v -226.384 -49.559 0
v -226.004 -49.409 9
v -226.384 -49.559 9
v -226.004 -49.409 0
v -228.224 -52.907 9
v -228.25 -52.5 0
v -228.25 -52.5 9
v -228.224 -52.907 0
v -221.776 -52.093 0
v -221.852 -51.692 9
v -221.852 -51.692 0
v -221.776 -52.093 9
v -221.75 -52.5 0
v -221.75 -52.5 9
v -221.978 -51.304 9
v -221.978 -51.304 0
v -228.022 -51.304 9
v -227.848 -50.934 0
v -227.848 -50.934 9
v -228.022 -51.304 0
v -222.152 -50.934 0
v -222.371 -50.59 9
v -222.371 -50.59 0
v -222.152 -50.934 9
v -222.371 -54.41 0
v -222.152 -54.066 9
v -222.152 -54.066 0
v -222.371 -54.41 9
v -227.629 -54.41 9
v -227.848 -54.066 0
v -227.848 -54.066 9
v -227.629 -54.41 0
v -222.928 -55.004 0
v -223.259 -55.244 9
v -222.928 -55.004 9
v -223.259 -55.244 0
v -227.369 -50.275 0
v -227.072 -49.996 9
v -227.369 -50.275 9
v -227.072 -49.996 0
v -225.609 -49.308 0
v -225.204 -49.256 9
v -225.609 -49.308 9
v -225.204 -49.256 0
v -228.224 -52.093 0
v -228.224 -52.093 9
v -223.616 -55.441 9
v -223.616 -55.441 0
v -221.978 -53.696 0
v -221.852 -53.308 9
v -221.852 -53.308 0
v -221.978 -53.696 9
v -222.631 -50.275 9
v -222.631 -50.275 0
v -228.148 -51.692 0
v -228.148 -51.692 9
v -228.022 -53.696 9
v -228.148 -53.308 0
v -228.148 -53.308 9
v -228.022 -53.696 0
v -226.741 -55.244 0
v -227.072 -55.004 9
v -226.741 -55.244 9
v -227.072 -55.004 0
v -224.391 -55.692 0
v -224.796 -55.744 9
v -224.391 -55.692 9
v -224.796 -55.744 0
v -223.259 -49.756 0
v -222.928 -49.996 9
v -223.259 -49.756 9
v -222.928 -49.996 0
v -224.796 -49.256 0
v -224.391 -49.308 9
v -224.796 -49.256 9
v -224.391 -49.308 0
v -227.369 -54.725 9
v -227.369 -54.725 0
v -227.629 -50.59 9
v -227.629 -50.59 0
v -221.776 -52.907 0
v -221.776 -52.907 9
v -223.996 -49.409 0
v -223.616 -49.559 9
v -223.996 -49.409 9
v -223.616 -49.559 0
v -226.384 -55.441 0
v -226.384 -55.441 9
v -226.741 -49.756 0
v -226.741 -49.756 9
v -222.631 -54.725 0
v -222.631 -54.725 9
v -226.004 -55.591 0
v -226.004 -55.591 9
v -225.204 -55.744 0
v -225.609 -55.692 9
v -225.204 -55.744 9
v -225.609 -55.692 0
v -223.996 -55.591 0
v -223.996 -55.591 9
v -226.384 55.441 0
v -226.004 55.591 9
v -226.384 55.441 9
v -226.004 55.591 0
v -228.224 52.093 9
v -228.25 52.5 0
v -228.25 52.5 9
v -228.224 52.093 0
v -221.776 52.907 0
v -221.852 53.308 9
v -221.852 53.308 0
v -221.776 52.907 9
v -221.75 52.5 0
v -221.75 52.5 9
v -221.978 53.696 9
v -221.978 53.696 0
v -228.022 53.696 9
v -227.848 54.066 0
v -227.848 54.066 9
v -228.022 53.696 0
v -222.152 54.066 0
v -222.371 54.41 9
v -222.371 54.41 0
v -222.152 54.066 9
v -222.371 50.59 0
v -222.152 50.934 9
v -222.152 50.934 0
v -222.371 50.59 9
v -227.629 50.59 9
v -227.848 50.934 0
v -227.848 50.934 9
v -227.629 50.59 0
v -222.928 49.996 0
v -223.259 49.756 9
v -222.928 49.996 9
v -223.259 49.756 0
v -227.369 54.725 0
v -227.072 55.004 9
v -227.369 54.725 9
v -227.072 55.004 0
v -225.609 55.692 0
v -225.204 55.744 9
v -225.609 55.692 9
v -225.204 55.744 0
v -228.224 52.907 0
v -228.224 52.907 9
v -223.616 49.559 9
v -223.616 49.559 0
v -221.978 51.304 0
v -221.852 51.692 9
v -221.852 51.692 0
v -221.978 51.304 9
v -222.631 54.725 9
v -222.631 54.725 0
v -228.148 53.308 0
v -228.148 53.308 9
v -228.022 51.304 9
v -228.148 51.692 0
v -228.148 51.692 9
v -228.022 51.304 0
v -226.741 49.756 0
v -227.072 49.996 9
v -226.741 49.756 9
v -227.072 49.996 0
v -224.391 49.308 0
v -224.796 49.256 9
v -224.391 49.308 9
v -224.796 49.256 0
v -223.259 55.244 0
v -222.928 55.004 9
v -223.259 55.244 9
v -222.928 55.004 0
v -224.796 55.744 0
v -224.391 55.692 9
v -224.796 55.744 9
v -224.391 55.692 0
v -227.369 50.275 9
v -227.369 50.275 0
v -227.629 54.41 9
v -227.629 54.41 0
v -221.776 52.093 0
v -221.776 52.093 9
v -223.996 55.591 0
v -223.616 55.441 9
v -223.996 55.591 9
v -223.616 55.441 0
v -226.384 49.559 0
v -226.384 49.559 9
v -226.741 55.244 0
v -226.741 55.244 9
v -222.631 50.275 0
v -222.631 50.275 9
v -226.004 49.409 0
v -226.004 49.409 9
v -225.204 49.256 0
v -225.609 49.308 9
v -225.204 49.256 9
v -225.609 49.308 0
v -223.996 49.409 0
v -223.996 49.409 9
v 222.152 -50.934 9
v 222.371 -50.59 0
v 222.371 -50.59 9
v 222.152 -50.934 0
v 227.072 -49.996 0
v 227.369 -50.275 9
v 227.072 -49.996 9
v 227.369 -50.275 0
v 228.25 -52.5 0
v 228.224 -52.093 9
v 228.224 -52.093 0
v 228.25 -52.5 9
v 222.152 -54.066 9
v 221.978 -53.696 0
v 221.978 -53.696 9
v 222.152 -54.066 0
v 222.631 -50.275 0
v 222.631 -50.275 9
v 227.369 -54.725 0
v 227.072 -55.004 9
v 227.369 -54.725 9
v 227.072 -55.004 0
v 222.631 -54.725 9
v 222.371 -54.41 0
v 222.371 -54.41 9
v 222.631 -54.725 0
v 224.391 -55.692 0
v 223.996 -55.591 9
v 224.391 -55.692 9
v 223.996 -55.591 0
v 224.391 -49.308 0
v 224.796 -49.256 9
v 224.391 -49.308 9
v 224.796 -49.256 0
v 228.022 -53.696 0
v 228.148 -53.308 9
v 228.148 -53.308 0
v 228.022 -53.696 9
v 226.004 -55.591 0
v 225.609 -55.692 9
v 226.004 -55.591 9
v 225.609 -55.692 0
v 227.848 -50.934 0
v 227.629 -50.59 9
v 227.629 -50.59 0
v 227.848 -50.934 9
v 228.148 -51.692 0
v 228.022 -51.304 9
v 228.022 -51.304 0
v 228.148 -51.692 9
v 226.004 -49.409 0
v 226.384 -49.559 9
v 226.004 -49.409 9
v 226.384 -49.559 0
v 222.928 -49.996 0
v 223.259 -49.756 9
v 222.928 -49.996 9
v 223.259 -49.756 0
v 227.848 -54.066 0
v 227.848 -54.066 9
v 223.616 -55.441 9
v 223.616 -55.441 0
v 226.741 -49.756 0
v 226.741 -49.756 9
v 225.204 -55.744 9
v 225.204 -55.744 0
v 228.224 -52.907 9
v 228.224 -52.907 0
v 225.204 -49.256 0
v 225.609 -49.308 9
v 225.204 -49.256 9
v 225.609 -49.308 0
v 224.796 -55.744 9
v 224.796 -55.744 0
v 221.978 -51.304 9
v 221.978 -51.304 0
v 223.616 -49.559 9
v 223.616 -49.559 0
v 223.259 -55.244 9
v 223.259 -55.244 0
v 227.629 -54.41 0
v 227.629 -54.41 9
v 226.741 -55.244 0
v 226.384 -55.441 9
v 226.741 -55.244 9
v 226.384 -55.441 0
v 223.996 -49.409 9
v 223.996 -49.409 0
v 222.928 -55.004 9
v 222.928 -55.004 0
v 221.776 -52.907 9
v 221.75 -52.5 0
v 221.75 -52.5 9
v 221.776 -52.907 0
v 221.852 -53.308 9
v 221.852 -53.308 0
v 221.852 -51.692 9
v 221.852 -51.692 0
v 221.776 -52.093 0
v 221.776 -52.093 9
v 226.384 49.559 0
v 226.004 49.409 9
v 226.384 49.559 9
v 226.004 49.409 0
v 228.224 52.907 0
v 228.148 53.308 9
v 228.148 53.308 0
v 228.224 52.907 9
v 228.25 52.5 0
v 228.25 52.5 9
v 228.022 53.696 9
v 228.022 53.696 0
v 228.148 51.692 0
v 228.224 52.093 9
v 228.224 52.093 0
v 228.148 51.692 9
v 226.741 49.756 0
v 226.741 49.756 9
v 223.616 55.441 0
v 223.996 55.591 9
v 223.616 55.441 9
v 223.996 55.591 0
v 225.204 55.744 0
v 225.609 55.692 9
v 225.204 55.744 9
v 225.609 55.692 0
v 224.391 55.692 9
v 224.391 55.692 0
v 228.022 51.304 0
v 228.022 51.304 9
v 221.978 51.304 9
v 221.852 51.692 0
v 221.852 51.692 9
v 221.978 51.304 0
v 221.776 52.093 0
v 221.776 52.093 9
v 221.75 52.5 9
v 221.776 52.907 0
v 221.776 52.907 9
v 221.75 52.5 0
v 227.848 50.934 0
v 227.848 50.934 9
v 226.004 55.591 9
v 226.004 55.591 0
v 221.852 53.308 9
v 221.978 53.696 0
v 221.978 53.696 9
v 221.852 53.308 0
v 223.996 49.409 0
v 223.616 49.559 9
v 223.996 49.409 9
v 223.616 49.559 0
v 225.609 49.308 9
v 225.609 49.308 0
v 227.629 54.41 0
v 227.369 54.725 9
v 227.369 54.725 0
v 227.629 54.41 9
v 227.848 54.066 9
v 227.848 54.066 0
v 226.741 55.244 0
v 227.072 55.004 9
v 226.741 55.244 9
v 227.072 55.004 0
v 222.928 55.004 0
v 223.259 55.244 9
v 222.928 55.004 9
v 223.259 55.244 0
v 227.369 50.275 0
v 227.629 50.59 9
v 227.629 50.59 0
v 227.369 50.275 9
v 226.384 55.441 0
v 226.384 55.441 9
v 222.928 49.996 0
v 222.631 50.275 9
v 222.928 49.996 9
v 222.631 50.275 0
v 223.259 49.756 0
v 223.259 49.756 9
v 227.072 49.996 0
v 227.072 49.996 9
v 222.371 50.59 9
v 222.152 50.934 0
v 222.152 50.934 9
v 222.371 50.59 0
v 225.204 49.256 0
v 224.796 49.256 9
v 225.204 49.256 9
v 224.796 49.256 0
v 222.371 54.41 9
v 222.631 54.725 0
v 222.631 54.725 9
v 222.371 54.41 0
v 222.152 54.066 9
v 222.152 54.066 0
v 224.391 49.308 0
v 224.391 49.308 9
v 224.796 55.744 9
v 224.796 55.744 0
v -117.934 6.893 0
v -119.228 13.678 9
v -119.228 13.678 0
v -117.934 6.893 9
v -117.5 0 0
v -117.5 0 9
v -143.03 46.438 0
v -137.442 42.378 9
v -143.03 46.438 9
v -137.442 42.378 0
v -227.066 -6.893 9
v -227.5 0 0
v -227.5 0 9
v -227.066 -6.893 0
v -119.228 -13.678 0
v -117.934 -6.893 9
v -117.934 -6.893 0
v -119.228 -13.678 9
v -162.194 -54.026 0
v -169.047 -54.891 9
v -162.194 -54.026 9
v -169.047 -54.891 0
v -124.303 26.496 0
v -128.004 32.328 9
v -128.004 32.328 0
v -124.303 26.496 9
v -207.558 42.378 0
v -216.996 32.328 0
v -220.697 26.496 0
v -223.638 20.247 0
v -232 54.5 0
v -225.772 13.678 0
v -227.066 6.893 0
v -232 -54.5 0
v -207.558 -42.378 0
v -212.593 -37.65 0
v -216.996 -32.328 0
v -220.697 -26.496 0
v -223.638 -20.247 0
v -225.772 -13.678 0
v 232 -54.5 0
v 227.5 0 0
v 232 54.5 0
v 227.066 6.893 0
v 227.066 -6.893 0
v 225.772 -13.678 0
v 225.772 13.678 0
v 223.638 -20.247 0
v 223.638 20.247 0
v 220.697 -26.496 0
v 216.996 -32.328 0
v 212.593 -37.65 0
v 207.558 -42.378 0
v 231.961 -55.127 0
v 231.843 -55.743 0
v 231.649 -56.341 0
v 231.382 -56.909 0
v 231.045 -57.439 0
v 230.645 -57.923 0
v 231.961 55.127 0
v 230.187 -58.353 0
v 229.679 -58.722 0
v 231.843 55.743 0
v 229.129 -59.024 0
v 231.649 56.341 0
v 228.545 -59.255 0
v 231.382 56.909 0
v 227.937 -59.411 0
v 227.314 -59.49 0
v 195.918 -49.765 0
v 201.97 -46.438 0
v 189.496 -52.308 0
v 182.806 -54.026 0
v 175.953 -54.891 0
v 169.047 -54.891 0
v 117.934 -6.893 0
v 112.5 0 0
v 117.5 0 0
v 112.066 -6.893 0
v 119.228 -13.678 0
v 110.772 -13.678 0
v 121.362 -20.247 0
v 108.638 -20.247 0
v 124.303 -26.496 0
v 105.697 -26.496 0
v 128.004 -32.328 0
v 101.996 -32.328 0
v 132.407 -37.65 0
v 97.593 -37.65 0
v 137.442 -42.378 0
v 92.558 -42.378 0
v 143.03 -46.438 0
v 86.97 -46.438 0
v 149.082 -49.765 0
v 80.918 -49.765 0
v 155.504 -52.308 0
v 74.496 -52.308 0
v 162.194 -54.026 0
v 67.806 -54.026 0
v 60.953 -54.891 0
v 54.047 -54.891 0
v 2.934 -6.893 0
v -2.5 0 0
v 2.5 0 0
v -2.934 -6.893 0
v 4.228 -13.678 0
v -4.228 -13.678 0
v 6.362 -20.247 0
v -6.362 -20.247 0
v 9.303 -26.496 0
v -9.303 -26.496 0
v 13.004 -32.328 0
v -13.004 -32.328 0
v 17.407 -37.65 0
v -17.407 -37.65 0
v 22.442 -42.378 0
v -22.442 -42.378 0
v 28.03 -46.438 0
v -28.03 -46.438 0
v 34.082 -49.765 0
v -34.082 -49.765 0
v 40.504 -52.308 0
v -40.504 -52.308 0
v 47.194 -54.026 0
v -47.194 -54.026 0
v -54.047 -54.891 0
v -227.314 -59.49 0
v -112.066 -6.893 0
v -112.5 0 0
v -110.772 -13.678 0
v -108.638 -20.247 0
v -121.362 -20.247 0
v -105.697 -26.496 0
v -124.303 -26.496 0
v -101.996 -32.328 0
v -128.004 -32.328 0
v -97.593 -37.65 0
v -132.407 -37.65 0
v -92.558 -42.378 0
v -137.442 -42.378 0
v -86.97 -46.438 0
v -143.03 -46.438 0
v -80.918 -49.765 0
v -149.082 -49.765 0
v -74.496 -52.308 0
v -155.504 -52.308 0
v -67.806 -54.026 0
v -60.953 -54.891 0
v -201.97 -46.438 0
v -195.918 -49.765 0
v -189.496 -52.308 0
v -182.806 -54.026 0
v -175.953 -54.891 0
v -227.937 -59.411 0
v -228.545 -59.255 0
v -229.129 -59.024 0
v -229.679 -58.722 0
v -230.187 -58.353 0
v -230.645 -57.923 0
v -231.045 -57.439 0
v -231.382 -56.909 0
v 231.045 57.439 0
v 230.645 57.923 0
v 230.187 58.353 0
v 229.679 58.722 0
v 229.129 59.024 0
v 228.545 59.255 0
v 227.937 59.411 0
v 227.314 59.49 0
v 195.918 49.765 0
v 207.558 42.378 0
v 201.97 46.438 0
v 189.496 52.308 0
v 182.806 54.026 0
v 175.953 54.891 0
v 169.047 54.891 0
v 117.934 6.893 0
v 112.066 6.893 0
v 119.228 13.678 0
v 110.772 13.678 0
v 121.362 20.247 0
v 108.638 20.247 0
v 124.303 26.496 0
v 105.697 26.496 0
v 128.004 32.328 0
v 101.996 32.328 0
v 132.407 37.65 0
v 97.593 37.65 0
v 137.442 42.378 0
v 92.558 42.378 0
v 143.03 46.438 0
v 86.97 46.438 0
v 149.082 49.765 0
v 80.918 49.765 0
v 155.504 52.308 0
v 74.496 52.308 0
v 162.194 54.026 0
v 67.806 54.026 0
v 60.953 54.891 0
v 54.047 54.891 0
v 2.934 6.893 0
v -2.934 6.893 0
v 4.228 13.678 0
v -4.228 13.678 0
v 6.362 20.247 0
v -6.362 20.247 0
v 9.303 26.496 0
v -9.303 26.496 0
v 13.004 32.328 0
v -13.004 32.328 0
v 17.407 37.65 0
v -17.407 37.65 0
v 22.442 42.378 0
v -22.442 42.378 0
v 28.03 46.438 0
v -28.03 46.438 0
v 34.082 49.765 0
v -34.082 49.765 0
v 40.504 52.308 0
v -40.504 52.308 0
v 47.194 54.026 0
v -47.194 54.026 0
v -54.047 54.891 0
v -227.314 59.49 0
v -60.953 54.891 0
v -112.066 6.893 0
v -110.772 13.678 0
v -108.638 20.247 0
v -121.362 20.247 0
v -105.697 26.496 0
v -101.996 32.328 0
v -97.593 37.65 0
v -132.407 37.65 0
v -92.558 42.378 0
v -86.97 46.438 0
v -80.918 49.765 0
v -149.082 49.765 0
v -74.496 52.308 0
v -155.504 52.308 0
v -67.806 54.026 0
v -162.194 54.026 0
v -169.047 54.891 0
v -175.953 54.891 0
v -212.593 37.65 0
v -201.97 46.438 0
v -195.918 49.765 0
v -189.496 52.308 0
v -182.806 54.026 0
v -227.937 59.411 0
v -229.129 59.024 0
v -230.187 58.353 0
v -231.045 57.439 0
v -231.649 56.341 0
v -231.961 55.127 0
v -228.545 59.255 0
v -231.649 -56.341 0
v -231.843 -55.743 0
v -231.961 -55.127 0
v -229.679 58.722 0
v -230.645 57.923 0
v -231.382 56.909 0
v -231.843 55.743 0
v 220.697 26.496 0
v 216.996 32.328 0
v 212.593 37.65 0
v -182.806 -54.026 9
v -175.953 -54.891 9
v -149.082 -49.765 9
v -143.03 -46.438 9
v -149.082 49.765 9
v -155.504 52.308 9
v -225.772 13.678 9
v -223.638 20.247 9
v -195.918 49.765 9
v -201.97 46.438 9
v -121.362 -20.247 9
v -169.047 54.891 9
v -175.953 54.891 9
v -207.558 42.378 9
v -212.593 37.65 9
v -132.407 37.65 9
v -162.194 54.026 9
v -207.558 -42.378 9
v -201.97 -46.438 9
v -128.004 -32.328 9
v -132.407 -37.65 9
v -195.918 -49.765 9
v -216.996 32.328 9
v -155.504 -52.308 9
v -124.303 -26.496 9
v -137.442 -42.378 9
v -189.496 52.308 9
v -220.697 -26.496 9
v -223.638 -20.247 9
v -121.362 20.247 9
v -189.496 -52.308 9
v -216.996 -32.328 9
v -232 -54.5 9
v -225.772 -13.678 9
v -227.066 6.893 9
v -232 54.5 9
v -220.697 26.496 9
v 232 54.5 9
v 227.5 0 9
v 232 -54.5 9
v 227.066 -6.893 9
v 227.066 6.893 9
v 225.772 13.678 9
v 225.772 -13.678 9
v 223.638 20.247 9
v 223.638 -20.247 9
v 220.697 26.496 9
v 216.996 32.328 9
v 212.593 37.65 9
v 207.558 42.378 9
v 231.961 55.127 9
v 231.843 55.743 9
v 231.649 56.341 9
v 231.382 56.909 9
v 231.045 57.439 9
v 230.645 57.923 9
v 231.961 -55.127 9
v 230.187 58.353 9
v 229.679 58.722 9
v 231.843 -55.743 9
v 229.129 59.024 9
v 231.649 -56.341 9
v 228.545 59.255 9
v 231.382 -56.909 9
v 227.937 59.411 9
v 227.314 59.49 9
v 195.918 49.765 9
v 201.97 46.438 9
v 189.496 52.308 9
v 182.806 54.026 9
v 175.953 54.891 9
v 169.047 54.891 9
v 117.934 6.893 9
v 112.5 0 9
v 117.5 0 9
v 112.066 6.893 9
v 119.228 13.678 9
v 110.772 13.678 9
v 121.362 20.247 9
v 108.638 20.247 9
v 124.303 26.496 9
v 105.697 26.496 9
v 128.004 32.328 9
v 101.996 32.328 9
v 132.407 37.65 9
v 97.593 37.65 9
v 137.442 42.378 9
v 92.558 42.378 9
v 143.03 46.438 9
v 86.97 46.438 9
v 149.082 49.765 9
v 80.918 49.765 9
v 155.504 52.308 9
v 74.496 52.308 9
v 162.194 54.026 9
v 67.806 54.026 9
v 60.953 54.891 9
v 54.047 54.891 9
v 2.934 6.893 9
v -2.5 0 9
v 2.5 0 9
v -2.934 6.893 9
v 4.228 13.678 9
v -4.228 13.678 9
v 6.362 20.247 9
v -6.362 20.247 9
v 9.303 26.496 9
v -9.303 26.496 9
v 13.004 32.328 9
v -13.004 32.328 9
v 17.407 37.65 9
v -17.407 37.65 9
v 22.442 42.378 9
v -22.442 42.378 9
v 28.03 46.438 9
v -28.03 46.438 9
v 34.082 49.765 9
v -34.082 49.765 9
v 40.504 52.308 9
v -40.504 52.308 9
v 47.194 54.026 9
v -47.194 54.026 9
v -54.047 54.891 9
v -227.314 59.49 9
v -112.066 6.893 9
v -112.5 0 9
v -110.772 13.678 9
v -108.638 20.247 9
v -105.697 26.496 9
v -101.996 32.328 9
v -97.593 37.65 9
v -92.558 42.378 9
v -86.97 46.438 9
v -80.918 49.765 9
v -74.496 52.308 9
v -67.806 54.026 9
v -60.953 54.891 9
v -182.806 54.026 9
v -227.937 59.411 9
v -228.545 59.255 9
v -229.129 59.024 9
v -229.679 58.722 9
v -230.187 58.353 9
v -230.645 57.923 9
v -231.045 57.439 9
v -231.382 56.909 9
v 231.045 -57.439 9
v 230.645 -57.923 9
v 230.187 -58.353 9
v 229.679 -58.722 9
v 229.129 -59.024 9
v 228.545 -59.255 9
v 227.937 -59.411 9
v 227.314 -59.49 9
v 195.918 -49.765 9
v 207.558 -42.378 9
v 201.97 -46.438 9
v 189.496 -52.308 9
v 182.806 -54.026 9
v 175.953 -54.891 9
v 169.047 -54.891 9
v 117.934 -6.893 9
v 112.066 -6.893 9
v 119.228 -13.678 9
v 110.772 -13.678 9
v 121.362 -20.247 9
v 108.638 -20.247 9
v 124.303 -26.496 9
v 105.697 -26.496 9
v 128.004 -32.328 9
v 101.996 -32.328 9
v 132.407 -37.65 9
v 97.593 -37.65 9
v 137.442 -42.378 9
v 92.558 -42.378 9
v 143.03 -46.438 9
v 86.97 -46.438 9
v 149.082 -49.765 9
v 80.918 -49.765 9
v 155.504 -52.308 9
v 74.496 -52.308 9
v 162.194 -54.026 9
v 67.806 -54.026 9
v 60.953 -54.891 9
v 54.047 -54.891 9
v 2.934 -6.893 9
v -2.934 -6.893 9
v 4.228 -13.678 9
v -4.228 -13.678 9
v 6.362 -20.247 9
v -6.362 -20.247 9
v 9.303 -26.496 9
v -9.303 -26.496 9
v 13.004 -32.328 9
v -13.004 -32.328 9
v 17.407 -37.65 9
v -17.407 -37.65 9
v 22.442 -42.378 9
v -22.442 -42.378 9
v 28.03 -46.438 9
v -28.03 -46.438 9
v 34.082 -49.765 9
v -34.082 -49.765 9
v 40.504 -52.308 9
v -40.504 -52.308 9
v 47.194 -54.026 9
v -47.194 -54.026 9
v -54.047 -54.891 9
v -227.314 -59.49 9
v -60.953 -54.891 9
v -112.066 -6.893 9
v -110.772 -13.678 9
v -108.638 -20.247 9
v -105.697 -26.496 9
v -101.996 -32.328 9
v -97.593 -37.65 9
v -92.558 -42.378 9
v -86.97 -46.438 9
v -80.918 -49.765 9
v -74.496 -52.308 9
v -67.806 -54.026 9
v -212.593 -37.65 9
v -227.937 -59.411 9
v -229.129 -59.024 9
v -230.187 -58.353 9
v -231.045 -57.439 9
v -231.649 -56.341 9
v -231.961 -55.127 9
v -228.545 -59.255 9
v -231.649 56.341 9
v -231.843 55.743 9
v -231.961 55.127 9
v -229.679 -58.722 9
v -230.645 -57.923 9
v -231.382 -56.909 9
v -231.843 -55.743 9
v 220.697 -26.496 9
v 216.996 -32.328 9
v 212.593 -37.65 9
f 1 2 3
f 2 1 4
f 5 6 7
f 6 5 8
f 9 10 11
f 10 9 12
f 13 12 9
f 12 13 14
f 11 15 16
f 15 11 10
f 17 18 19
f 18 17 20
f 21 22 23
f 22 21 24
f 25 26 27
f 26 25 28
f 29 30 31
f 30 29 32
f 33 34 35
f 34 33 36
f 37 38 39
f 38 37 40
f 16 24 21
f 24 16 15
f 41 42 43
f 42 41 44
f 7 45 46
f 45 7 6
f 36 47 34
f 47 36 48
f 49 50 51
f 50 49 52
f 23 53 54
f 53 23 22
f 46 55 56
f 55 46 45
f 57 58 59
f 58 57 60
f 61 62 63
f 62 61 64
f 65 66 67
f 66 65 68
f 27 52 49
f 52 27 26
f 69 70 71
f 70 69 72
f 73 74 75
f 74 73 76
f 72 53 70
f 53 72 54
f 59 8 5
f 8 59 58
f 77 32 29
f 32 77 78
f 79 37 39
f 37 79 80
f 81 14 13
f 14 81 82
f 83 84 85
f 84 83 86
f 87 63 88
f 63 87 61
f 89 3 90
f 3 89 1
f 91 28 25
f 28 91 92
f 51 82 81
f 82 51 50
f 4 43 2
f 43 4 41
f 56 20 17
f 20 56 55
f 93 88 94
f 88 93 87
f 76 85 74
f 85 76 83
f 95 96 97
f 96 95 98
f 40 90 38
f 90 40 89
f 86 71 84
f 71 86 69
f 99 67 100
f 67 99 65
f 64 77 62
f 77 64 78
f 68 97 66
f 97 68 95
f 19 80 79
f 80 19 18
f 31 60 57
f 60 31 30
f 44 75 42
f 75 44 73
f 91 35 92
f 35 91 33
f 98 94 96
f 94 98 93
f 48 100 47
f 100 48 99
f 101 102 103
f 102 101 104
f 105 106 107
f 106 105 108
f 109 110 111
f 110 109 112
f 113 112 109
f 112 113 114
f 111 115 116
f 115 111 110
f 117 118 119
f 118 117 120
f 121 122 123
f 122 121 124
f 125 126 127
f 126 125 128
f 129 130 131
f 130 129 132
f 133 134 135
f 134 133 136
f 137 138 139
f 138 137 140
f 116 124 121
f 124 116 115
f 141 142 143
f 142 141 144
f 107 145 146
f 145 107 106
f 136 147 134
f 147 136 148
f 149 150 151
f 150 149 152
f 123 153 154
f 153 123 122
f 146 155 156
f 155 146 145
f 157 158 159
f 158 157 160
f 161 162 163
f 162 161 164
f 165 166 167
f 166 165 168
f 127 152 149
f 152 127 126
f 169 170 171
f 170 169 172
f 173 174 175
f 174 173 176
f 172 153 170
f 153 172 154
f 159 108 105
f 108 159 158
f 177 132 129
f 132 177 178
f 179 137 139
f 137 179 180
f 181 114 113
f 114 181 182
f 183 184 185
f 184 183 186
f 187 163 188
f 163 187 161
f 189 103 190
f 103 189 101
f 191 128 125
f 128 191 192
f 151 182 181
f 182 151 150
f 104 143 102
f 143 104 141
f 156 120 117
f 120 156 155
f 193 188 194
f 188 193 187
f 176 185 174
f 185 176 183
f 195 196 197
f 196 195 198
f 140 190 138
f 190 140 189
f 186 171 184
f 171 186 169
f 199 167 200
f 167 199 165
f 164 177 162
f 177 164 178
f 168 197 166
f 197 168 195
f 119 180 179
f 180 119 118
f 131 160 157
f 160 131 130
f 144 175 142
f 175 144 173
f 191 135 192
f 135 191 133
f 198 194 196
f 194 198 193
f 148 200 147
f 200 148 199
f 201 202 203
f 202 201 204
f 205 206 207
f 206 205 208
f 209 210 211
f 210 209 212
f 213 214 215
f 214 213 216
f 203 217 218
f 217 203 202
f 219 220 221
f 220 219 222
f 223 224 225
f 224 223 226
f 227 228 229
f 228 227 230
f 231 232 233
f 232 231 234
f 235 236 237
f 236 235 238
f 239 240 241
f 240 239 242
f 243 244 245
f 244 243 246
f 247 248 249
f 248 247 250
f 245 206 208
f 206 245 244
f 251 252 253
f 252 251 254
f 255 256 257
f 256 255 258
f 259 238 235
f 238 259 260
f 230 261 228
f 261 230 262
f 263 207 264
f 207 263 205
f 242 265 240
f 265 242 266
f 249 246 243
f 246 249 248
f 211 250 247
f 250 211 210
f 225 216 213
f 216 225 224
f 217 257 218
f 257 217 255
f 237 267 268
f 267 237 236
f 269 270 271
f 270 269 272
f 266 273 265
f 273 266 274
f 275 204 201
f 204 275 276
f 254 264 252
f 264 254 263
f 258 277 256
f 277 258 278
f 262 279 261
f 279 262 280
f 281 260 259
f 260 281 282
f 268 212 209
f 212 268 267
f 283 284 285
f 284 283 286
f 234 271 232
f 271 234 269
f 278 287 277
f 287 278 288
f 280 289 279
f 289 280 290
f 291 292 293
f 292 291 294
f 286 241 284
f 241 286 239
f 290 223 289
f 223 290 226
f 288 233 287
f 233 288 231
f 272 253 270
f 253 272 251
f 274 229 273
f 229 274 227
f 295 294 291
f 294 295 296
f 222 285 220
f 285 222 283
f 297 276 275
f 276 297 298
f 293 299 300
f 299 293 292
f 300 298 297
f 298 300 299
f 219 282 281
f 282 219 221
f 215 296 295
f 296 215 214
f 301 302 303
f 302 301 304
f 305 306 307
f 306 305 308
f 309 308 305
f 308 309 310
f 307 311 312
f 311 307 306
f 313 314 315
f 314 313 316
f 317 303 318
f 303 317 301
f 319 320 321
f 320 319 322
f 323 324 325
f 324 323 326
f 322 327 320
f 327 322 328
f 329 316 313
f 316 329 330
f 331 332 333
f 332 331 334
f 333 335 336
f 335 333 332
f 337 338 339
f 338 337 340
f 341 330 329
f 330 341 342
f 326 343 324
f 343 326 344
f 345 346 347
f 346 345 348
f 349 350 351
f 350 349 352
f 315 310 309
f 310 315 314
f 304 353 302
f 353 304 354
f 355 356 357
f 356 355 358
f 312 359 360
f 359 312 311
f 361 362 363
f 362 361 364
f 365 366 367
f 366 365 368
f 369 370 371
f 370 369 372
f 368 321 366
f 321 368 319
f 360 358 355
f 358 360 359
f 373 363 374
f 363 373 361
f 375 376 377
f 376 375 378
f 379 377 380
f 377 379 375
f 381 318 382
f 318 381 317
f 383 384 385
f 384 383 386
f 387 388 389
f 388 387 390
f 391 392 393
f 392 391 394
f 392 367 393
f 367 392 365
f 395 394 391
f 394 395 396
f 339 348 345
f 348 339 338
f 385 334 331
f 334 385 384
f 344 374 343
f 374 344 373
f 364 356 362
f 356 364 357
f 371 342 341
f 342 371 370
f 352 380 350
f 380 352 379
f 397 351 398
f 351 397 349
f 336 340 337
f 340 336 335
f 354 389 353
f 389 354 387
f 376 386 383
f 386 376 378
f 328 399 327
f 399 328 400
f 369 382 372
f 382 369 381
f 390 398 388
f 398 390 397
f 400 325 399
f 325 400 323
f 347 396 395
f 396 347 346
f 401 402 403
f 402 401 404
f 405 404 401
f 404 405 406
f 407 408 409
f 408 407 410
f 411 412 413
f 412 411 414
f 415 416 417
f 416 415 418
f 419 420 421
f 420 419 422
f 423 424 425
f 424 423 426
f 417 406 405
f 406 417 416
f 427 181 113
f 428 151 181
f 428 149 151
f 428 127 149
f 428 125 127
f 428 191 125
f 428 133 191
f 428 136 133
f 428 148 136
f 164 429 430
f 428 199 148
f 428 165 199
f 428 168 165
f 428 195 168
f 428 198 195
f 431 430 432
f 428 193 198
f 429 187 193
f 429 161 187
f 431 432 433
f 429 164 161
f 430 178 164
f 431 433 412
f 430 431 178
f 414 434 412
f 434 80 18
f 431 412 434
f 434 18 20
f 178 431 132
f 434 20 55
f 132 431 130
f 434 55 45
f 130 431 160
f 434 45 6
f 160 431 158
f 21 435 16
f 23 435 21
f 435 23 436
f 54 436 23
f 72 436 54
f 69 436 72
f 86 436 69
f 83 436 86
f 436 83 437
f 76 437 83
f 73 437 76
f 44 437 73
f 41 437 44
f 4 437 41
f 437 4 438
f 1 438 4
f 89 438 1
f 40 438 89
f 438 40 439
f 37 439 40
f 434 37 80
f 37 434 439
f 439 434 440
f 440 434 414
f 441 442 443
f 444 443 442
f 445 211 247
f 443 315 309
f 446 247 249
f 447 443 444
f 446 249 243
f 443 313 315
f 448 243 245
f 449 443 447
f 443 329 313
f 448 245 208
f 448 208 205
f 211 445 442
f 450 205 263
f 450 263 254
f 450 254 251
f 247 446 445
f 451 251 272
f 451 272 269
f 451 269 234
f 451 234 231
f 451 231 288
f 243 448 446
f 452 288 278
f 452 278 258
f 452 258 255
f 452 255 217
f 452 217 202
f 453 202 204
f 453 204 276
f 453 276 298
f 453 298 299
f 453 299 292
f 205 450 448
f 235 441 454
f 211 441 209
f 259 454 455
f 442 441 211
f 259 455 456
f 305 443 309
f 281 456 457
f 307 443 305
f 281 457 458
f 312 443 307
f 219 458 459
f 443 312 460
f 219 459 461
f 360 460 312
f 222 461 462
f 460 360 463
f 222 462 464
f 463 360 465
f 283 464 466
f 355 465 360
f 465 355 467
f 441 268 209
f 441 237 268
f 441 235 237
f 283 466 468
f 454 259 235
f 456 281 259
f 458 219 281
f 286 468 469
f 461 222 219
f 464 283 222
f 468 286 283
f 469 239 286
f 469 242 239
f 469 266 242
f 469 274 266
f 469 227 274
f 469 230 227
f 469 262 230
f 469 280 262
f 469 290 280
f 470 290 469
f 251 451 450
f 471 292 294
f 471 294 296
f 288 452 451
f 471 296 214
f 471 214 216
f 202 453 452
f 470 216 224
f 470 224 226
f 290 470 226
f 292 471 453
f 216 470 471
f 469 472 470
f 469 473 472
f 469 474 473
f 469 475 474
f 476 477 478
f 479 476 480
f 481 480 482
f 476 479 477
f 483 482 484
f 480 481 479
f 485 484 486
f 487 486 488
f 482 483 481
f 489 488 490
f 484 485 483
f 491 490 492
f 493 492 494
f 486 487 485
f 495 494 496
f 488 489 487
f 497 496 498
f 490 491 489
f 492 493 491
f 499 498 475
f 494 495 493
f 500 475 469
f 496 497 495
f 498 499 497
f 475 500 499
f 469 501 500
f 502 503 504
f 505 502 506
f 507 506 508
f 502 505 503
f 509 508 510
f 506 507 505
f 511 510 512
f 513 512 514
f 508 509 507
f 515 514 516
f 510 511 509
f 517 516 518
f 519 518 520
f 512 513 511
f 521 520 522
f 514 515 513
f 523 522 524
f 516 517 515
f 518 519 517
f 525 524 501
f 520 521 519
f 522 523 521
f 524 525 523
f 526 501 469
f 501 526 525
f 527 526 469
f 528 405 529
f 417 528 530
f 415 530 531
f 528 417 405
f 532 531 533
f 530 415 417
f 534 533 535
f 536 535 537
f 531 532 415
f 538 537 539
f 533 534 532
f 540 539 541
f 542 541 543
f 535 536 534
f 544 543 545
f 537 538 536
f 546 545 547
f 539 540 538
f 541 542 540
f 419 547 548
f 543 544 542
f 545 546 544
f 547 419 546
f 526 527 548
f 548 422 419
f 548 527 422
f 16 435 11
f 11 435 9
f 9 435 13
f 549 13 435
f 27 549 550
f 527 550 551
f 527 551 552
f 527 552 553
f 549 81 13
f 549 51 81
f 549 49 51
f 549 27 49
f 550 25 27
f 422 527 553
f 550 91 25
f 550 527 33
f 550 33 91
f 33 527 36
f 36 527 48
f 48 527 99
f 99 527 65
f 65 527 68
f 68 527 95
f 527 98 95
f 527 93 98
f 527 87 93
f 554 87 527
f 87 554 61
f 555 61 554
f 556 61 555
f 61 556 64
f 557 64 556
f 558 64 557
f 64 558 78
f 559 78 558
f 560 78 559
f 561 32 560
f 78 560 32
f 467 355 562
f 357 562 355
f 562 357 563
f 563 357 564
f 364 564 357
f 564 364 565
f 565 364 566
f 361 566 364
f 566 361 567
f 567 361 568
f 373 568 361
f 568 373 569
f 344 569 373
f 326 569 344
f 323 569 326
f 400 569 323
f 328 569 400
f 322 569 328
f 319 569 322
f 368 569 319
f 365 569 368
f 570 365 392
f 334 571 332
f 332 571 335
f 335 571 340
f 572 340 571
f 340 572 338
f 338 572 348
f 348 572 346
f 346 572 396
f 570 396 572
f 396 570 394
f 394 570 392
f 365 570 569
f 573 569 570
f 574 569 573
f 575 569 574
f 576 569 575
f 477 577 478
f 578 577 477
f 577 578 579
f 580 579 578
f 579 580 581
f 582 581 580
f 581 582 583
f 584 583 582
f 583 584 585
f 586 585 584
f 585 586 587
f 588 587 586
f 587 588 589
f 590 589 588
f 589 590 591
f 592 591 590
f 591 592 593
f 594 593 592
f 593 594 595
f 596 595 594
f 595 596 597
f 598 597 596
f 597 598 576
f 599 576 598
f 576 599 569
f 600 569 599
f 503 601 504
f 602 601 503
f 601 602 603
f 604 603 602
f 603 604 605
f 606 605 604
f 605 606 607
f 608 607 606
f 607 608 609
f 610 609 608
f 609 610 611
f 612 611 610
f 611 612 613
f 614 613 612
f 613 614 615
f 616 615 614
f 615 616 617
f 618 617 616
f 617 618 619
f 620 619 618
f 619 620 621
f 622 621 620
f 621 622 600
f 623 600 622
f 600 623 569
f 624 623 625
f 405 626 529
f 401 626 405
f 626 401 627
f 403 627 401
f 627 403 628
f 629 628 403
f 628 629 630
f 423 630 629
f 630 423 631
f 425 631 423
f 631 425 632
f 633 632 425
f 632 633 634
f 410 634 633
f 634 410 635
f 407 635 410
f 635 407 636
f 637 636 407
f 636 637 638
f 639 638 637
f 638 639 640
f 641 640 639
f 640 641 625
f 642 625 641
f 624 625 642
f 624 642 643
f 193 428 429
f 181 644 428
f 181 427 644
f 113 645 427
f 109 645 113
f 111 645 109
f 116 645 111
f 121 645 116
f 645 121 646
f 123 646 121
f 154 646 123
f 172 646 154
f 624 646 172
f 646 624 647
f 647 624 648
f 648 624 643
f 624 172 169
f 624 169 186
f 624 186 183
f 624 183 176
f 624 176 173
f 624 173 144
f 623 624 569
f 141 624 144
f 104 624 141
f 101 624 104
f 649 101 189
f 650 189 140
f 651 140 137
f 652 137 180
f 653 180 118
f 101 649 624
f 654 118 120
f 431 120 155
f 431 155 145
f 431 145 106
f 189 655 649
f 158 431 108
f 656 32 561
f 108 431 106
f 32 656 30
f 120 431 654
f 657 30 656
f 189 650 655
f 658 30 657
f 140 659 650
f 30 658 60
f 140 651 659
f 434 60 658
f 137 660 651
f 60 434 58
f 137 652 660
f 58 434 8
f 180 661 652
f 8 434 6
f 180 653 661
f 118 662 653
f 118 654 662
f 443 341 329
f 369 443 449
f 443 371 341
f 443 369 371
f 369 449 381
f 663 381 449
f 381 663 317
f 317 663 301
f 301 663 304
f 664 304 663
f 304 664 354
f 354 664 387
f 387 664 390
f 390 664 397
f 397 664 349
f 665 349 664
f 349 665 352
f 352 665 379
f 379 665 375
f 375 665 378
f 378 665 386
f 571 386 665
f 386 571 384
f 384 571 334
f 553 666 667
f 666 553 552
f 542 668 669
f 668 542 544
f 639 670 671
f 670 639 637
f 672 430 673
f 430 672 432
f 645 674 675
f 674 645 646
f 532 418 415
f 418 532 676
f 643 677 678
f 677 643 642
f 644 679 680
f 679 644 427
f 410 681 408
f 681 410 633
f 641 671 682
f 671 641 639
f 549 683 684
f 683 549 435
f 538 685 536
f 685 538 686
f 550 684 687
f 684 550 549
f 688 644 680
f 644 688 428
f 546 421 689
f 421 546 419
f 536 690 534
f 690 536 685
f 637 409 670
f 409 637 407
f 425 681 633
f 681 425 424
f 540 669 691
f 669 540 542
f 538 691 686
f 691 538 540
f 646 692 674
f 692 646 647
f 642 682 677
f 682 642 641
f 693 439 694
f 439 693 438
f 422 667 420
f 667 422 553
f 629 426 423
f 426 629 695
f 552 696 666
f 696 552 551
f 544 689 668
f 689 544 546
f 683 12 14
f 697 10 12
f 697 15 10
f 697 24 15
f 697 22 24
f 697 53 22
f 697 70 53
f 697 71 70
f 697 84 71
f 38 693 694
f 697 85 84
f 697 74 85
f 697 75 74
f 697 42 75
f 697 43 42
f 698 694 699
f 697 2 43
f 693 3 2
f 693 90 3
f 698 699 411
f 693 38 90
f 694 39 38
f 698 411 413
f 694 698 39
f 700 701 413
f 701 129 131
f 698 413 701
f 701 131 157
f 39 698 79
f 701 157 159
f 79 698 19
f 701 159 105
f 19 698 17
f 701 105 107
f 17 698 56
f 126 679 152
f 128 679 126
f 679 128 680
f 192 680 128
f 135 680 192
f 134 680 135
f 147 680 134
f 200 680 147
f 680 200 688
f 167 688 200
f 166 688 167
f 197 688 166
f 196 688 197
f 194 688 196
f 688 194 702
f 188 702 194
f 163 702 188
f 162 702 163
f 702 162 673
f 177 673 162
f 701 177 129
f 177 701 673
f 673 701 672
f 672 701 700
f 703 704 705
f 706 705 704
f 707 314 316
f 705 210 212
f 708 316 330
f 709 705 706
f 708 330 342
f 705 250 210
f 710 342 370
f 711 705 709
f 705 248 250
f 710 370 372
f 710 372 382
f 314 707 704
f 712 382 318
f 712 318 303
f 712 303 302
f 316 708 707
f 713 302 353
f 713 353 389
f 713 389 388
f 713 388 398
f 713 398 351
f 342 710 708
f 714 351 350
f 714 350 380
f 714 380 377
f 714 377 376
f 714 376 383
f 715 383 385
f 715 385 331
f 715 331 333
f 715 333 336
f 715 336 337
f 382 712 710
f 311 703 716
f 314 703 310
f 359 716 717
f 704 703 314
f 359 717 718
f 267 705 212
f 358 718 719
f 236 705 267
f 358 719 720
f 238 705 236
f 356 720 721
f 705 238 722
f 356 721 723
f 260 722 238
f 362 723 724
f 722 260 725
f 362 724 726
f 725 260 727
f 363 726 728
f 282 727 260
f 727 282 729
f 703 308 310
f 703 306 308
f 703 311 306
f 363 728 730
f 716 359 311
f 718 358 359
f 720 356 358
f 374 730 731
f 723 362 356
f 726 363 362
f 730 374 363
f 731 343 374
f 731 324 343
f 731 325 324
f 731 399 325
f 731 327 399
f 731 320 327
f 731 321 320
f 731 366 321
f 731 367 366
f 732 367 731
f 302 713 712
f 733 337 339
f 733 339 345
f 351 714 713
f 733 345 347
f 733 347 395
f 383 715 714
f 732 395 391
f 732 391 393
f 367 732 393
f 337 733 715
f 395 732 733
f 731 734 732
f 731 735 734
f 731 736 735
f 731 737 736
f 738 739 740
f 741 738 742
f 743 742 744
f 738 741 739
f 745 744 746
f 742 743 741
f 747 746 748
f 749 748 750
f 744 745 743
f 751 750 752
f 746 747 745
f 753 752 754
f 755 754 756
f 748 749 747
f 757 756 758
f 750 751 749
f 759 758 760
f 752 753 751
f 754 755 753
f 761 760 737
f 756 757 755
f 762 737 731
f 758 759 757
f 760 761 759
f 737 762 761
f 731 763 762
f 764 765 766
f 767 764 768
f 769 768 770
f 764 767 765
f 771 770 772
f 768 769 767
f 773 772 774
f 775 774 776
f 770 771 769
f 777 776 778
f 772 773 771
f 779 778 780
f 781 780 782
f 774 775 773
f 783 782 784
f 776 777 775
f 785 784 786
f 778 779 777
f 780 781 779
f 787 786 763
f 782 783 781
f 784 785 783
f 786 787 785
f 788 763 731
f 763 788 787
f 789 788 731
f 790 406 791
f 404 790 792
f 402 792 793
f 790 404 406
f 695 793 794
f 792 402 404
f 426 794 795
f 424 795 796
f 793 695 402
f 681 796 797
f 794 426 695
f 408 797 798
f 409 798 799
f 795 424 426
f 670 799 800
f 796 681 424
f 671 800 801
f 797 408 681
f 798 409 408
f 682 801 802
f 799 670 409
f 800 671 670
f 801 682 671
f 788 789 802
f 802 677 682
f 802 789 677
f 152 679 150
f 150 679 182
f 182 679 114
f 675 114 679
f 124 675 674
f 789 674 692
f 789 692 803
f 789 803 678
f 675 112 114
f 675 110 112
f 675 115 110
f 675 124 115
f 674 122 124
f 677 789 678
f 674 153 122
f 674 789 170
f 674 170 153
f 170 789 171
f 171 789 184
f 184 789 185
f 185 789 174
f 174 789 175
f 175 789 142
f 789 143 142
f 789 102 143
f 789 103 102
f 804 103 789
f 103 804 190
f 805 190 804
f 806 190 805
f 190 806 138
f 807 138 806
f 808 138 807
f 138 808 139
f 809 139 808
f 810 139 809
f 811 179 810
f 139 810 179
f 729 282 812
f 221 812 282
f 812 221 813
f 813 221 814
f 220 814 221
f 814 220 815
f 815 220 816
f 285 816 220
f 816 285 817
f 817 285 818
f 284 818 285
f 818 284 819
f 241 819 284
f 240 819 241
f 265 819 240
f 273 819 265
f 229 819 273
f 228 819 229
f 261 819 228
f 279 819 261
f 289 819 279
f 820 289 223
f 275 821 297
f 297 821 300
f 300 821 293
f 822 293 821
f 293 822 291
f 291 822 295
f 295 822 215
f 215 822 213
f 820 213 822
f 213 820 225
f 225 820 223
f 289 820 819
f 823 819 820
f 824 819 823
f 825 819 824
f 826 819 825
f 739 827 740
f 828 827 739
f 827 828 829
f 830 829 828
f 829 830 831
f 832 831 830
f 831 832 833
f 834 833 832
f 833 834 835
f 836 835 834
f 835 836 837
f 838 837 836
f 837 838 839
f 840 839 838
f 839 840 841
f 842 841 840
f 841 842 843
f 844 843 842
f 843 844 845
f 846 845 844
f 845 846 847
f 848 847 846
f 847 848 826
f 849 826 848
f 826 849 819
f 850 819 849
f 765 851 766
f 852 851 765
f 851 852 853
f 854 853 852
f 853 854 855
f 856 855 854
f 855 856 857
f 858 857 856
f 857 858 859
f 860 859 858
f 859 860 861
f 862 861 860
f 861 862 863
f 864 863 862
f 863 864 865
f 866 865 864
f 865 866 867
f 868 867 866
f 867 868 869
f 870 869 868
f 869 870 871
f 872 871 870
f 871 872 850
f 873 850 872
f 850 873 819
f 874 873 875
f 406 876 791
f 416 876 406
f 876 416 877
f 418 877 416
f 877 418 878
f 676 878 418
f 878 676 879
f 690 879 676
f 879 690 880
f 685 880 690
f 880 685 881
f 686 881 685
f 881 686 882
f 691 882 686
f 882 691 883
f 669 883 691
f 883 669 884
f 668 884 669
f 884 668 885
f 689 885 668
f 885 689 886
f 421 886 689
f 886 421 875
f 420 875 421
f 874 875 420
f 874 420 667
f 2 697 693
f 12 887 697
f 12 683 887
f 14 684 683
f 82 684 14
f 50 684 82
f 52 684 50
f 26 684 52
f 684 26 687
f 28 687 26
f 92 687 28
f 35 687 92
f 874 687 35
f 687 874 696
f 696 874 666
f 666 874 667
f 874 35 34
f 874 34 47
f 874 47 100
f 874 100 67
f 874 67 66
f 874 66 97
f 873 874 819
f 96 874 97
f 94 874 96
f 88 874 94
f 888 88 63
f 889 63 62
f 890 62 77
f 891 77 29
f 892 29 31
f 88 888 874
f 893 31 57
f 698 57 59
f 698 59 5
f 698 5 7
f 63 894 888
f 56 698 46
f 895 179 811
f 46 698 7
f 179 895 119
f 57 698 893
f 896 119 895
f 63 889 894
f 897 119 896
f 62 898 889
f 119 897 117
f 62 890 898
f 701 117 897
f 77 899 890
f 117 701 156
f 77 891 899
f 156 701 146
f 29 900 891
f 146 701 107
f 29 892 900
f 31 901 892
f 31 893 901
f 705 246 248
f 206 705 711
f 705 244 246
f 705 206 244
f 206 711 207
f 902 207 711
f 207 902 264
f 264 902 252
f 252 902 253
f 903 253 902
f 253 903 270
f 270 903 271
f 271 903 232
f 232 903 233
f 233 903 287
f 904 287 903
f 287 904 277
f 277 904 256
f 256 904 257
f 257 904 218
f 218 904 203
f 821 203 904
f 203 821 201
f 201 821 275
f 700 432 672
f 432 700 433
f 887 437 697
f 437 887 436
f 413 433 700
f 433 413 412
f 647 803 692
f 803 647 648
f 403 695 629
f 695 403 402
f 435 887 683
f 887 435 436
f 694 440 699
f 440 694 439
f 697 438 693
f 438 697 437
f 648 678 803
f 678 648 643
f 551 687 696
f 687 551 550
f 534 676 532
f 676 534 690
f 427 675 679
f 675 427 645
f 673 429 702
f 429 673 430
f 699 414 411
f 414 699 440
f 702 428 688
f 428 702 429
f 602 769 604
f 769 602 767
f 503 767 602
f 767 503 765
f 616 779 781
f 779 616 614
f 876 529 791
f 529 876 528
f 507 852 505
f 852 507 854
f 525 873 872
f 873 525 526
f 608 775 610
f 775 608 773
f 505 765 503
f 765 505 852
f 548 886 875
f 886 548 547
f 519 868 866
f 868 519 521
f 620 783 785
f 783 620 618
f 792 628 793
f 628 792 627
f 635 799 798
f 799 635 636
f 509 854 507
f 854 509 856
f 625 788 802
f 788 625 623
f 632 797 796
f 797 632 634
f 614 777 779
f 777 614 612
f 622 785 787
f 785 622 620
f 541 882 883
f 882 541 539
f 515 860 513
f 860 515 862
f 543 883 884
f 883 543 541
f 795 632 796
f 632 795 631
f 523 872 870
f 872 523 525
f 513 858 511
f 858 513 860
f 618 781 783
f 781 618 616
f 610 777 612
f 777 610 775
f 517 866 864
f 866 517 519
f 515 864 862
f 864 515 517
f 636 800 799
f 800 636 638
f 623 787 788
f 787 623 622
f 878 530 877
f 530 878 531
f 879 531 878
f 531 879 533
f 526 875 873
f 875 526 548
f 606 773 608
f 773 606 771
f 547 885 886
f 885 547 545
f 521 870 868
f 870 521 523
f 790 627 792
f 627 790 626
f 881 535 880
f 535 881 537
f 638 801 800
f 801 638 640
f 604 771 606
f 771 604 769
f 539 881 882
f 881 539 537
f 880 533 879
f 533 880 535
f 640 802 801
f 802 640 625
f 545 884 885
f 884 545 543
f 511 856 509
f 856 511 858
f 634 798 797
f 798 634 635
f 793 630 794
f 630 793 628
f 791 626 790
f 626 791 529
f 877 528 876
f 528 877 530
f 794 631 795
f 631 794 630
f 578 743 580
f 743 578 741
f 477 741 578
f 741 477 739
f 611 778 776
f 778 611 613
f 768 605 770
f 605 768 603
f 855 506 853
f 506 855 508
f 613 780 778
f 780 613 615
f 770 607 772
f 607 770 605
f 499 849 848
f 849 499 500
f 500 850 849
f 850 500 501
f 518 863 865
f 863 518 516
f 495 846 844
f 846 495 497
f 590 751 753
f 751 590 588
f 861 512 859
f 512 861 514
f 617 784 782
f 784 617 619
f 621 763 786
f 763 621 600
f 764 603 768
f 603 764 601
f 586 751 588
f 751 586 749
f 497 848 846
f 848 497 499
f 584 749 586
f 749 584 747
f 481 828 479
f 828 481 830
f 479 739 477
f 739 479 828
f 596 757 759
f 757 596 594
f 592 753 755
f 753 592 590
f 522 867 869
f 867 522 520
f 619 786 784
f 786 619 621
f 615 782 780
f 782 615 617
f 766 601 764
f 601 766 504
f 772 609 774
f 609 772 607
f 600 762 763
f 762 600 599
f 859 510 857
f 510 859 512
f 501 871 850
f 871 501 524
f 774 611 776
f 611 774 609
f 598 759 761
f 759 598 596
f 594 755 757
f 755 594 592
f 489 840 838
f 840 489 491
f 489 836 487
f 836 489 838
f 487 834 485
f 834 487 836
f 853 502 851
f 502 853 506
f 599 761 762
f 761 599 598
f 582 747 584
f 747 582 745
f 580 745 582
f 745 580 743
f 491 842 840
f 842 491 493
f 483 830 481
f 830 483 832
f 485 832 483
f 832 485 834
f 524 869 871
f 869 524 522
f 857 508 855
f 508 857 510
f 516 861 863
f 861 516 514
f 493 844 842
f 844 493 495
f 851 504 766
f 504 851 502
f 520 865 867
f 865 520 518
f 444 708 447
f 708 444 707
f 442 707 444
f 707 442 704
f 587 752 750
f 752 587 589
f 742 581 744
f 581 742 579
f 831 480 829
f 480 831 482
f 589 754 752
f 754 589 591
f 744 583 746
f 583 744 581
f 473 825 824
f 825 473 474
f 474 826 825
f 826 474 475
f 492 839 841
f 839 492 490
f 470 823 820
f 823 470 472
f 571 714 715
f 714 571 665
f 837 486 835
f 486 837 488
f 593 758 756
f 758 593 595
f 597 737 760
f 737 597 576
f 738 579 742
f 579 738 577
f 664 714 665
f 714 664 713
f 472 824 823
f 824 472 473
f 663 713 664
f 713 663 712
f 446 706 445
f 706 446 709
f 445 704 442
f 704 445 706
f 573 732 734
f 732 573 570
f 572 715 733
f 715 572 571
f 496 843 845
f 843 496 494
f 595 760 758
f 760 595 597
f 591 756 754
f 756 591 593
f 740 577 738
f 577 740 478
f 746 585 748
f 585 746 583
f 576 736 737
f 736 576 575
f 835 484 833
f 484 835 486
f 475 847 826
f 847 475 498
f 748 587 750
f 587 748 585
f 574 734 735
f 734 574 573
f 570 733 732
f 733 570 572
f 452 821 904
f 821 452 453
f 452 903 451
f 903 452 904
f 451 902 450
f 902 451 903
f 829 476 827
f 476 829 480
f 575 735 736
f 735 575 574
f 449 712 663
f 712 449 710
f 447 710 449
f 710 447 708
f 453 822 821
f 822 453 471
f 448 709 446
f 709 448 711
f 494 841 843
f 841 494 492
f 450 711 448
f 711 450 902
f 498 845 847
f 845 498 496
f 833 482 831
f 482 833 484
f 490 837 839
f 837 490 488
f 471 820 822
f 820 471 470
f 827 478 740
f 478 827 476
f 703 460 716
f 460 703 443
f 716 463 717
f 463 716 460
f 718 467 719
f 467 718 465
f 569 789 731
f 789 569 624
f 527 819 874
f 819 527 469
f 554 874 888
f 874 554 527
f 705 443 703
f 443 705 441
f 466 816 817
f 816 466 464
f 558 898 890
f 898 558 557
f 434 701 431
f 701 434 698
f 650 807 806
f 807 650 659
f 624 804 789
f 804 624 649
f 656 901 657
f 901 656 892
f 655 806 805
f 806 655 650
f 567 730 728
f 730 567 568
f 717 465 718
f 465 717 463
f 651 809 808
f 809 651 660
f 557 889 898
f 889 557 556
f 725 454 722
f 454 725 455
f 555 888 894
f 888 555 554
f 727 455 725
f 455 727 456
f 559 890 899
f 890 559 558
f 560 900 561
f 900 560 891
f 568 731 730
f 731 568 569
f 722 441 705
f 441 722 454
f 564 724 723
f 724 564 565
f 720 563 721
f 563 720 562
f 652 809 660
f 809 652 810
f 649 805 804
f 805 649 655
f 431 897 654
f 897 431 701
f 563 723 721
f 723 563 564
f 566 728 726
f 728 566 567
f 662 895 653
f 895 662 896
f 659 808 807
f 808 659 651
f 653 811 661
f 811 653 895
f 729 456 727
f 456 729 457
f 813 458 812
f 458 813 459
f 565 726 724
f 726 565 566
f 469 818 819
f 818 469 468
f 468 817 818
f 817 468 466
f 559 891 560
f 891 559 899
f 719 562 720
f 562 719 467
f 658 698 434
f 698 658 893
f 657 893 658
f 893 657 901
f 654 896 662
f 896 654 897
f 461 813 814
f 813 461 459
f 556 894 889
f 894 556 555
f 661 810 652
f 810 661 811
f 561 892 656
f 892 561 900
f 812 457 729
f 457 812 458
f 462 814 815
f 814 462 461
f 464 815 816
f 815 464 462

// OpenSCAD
$fn = 50;


difference() {
	union() {
		hull() {
			translate(v = [-227.0000000000, 54.5000000000, 0]) {
				cylinder(h = 9, r = 5);
			}
			translate(v = [227.0000000000, 54.5000000000, 0]) {
				cylinder(h = 9, r = 5);
			}
			translate(v = [-227.0000000000, -54.5000000000, 0]) {
				cylinder(h = 9, r = 5);
			}
			translate(v = [227.0000000000, -54.5000000000, 0]) {
				cylinder(h = 9, r = 5);
			}
		}
	}
	union() {
		#translate(v = [-225.0000000000, -52.5000000000, -100.0000000000]) {
			cylinder(h = 200, r = 3.2500000000);
		}
		#translate(v = [-225.0000000000, 52.5000000000, -100.0000000000]) {
			cylinder(h = 200, r = 3.2500000000);
		}
		#translate(v = [225.0000000000, -52.5000000000, -100.0000000000]) {
			cylinder(h = 200, r = 3.2500000000);
		}
		#translate(v = [225.0000000000, 52.5000000000, -100.0000000000]) {
			cylinder(h = 200, r = 3.2500000000);
		}
		#translate(v = [-172.5000000000, 0, 0]) {
			cylinder(h = 9, r = 55.0000000000);
		}
		#translate(v = [-57.5000000000, 0, 0]) {
			cylinder(h = 9, r = 55.0000000000);
		}
		#translate(v = [57.5000000000, 0, 0]) {
			cylinder(h = 9, r = 55.0000000000);
		}
		#translate(v = [172.5000000000, 0, 0]) {
			cylinder(h = 9, r = 55.0000000000);
		}
	}
}
